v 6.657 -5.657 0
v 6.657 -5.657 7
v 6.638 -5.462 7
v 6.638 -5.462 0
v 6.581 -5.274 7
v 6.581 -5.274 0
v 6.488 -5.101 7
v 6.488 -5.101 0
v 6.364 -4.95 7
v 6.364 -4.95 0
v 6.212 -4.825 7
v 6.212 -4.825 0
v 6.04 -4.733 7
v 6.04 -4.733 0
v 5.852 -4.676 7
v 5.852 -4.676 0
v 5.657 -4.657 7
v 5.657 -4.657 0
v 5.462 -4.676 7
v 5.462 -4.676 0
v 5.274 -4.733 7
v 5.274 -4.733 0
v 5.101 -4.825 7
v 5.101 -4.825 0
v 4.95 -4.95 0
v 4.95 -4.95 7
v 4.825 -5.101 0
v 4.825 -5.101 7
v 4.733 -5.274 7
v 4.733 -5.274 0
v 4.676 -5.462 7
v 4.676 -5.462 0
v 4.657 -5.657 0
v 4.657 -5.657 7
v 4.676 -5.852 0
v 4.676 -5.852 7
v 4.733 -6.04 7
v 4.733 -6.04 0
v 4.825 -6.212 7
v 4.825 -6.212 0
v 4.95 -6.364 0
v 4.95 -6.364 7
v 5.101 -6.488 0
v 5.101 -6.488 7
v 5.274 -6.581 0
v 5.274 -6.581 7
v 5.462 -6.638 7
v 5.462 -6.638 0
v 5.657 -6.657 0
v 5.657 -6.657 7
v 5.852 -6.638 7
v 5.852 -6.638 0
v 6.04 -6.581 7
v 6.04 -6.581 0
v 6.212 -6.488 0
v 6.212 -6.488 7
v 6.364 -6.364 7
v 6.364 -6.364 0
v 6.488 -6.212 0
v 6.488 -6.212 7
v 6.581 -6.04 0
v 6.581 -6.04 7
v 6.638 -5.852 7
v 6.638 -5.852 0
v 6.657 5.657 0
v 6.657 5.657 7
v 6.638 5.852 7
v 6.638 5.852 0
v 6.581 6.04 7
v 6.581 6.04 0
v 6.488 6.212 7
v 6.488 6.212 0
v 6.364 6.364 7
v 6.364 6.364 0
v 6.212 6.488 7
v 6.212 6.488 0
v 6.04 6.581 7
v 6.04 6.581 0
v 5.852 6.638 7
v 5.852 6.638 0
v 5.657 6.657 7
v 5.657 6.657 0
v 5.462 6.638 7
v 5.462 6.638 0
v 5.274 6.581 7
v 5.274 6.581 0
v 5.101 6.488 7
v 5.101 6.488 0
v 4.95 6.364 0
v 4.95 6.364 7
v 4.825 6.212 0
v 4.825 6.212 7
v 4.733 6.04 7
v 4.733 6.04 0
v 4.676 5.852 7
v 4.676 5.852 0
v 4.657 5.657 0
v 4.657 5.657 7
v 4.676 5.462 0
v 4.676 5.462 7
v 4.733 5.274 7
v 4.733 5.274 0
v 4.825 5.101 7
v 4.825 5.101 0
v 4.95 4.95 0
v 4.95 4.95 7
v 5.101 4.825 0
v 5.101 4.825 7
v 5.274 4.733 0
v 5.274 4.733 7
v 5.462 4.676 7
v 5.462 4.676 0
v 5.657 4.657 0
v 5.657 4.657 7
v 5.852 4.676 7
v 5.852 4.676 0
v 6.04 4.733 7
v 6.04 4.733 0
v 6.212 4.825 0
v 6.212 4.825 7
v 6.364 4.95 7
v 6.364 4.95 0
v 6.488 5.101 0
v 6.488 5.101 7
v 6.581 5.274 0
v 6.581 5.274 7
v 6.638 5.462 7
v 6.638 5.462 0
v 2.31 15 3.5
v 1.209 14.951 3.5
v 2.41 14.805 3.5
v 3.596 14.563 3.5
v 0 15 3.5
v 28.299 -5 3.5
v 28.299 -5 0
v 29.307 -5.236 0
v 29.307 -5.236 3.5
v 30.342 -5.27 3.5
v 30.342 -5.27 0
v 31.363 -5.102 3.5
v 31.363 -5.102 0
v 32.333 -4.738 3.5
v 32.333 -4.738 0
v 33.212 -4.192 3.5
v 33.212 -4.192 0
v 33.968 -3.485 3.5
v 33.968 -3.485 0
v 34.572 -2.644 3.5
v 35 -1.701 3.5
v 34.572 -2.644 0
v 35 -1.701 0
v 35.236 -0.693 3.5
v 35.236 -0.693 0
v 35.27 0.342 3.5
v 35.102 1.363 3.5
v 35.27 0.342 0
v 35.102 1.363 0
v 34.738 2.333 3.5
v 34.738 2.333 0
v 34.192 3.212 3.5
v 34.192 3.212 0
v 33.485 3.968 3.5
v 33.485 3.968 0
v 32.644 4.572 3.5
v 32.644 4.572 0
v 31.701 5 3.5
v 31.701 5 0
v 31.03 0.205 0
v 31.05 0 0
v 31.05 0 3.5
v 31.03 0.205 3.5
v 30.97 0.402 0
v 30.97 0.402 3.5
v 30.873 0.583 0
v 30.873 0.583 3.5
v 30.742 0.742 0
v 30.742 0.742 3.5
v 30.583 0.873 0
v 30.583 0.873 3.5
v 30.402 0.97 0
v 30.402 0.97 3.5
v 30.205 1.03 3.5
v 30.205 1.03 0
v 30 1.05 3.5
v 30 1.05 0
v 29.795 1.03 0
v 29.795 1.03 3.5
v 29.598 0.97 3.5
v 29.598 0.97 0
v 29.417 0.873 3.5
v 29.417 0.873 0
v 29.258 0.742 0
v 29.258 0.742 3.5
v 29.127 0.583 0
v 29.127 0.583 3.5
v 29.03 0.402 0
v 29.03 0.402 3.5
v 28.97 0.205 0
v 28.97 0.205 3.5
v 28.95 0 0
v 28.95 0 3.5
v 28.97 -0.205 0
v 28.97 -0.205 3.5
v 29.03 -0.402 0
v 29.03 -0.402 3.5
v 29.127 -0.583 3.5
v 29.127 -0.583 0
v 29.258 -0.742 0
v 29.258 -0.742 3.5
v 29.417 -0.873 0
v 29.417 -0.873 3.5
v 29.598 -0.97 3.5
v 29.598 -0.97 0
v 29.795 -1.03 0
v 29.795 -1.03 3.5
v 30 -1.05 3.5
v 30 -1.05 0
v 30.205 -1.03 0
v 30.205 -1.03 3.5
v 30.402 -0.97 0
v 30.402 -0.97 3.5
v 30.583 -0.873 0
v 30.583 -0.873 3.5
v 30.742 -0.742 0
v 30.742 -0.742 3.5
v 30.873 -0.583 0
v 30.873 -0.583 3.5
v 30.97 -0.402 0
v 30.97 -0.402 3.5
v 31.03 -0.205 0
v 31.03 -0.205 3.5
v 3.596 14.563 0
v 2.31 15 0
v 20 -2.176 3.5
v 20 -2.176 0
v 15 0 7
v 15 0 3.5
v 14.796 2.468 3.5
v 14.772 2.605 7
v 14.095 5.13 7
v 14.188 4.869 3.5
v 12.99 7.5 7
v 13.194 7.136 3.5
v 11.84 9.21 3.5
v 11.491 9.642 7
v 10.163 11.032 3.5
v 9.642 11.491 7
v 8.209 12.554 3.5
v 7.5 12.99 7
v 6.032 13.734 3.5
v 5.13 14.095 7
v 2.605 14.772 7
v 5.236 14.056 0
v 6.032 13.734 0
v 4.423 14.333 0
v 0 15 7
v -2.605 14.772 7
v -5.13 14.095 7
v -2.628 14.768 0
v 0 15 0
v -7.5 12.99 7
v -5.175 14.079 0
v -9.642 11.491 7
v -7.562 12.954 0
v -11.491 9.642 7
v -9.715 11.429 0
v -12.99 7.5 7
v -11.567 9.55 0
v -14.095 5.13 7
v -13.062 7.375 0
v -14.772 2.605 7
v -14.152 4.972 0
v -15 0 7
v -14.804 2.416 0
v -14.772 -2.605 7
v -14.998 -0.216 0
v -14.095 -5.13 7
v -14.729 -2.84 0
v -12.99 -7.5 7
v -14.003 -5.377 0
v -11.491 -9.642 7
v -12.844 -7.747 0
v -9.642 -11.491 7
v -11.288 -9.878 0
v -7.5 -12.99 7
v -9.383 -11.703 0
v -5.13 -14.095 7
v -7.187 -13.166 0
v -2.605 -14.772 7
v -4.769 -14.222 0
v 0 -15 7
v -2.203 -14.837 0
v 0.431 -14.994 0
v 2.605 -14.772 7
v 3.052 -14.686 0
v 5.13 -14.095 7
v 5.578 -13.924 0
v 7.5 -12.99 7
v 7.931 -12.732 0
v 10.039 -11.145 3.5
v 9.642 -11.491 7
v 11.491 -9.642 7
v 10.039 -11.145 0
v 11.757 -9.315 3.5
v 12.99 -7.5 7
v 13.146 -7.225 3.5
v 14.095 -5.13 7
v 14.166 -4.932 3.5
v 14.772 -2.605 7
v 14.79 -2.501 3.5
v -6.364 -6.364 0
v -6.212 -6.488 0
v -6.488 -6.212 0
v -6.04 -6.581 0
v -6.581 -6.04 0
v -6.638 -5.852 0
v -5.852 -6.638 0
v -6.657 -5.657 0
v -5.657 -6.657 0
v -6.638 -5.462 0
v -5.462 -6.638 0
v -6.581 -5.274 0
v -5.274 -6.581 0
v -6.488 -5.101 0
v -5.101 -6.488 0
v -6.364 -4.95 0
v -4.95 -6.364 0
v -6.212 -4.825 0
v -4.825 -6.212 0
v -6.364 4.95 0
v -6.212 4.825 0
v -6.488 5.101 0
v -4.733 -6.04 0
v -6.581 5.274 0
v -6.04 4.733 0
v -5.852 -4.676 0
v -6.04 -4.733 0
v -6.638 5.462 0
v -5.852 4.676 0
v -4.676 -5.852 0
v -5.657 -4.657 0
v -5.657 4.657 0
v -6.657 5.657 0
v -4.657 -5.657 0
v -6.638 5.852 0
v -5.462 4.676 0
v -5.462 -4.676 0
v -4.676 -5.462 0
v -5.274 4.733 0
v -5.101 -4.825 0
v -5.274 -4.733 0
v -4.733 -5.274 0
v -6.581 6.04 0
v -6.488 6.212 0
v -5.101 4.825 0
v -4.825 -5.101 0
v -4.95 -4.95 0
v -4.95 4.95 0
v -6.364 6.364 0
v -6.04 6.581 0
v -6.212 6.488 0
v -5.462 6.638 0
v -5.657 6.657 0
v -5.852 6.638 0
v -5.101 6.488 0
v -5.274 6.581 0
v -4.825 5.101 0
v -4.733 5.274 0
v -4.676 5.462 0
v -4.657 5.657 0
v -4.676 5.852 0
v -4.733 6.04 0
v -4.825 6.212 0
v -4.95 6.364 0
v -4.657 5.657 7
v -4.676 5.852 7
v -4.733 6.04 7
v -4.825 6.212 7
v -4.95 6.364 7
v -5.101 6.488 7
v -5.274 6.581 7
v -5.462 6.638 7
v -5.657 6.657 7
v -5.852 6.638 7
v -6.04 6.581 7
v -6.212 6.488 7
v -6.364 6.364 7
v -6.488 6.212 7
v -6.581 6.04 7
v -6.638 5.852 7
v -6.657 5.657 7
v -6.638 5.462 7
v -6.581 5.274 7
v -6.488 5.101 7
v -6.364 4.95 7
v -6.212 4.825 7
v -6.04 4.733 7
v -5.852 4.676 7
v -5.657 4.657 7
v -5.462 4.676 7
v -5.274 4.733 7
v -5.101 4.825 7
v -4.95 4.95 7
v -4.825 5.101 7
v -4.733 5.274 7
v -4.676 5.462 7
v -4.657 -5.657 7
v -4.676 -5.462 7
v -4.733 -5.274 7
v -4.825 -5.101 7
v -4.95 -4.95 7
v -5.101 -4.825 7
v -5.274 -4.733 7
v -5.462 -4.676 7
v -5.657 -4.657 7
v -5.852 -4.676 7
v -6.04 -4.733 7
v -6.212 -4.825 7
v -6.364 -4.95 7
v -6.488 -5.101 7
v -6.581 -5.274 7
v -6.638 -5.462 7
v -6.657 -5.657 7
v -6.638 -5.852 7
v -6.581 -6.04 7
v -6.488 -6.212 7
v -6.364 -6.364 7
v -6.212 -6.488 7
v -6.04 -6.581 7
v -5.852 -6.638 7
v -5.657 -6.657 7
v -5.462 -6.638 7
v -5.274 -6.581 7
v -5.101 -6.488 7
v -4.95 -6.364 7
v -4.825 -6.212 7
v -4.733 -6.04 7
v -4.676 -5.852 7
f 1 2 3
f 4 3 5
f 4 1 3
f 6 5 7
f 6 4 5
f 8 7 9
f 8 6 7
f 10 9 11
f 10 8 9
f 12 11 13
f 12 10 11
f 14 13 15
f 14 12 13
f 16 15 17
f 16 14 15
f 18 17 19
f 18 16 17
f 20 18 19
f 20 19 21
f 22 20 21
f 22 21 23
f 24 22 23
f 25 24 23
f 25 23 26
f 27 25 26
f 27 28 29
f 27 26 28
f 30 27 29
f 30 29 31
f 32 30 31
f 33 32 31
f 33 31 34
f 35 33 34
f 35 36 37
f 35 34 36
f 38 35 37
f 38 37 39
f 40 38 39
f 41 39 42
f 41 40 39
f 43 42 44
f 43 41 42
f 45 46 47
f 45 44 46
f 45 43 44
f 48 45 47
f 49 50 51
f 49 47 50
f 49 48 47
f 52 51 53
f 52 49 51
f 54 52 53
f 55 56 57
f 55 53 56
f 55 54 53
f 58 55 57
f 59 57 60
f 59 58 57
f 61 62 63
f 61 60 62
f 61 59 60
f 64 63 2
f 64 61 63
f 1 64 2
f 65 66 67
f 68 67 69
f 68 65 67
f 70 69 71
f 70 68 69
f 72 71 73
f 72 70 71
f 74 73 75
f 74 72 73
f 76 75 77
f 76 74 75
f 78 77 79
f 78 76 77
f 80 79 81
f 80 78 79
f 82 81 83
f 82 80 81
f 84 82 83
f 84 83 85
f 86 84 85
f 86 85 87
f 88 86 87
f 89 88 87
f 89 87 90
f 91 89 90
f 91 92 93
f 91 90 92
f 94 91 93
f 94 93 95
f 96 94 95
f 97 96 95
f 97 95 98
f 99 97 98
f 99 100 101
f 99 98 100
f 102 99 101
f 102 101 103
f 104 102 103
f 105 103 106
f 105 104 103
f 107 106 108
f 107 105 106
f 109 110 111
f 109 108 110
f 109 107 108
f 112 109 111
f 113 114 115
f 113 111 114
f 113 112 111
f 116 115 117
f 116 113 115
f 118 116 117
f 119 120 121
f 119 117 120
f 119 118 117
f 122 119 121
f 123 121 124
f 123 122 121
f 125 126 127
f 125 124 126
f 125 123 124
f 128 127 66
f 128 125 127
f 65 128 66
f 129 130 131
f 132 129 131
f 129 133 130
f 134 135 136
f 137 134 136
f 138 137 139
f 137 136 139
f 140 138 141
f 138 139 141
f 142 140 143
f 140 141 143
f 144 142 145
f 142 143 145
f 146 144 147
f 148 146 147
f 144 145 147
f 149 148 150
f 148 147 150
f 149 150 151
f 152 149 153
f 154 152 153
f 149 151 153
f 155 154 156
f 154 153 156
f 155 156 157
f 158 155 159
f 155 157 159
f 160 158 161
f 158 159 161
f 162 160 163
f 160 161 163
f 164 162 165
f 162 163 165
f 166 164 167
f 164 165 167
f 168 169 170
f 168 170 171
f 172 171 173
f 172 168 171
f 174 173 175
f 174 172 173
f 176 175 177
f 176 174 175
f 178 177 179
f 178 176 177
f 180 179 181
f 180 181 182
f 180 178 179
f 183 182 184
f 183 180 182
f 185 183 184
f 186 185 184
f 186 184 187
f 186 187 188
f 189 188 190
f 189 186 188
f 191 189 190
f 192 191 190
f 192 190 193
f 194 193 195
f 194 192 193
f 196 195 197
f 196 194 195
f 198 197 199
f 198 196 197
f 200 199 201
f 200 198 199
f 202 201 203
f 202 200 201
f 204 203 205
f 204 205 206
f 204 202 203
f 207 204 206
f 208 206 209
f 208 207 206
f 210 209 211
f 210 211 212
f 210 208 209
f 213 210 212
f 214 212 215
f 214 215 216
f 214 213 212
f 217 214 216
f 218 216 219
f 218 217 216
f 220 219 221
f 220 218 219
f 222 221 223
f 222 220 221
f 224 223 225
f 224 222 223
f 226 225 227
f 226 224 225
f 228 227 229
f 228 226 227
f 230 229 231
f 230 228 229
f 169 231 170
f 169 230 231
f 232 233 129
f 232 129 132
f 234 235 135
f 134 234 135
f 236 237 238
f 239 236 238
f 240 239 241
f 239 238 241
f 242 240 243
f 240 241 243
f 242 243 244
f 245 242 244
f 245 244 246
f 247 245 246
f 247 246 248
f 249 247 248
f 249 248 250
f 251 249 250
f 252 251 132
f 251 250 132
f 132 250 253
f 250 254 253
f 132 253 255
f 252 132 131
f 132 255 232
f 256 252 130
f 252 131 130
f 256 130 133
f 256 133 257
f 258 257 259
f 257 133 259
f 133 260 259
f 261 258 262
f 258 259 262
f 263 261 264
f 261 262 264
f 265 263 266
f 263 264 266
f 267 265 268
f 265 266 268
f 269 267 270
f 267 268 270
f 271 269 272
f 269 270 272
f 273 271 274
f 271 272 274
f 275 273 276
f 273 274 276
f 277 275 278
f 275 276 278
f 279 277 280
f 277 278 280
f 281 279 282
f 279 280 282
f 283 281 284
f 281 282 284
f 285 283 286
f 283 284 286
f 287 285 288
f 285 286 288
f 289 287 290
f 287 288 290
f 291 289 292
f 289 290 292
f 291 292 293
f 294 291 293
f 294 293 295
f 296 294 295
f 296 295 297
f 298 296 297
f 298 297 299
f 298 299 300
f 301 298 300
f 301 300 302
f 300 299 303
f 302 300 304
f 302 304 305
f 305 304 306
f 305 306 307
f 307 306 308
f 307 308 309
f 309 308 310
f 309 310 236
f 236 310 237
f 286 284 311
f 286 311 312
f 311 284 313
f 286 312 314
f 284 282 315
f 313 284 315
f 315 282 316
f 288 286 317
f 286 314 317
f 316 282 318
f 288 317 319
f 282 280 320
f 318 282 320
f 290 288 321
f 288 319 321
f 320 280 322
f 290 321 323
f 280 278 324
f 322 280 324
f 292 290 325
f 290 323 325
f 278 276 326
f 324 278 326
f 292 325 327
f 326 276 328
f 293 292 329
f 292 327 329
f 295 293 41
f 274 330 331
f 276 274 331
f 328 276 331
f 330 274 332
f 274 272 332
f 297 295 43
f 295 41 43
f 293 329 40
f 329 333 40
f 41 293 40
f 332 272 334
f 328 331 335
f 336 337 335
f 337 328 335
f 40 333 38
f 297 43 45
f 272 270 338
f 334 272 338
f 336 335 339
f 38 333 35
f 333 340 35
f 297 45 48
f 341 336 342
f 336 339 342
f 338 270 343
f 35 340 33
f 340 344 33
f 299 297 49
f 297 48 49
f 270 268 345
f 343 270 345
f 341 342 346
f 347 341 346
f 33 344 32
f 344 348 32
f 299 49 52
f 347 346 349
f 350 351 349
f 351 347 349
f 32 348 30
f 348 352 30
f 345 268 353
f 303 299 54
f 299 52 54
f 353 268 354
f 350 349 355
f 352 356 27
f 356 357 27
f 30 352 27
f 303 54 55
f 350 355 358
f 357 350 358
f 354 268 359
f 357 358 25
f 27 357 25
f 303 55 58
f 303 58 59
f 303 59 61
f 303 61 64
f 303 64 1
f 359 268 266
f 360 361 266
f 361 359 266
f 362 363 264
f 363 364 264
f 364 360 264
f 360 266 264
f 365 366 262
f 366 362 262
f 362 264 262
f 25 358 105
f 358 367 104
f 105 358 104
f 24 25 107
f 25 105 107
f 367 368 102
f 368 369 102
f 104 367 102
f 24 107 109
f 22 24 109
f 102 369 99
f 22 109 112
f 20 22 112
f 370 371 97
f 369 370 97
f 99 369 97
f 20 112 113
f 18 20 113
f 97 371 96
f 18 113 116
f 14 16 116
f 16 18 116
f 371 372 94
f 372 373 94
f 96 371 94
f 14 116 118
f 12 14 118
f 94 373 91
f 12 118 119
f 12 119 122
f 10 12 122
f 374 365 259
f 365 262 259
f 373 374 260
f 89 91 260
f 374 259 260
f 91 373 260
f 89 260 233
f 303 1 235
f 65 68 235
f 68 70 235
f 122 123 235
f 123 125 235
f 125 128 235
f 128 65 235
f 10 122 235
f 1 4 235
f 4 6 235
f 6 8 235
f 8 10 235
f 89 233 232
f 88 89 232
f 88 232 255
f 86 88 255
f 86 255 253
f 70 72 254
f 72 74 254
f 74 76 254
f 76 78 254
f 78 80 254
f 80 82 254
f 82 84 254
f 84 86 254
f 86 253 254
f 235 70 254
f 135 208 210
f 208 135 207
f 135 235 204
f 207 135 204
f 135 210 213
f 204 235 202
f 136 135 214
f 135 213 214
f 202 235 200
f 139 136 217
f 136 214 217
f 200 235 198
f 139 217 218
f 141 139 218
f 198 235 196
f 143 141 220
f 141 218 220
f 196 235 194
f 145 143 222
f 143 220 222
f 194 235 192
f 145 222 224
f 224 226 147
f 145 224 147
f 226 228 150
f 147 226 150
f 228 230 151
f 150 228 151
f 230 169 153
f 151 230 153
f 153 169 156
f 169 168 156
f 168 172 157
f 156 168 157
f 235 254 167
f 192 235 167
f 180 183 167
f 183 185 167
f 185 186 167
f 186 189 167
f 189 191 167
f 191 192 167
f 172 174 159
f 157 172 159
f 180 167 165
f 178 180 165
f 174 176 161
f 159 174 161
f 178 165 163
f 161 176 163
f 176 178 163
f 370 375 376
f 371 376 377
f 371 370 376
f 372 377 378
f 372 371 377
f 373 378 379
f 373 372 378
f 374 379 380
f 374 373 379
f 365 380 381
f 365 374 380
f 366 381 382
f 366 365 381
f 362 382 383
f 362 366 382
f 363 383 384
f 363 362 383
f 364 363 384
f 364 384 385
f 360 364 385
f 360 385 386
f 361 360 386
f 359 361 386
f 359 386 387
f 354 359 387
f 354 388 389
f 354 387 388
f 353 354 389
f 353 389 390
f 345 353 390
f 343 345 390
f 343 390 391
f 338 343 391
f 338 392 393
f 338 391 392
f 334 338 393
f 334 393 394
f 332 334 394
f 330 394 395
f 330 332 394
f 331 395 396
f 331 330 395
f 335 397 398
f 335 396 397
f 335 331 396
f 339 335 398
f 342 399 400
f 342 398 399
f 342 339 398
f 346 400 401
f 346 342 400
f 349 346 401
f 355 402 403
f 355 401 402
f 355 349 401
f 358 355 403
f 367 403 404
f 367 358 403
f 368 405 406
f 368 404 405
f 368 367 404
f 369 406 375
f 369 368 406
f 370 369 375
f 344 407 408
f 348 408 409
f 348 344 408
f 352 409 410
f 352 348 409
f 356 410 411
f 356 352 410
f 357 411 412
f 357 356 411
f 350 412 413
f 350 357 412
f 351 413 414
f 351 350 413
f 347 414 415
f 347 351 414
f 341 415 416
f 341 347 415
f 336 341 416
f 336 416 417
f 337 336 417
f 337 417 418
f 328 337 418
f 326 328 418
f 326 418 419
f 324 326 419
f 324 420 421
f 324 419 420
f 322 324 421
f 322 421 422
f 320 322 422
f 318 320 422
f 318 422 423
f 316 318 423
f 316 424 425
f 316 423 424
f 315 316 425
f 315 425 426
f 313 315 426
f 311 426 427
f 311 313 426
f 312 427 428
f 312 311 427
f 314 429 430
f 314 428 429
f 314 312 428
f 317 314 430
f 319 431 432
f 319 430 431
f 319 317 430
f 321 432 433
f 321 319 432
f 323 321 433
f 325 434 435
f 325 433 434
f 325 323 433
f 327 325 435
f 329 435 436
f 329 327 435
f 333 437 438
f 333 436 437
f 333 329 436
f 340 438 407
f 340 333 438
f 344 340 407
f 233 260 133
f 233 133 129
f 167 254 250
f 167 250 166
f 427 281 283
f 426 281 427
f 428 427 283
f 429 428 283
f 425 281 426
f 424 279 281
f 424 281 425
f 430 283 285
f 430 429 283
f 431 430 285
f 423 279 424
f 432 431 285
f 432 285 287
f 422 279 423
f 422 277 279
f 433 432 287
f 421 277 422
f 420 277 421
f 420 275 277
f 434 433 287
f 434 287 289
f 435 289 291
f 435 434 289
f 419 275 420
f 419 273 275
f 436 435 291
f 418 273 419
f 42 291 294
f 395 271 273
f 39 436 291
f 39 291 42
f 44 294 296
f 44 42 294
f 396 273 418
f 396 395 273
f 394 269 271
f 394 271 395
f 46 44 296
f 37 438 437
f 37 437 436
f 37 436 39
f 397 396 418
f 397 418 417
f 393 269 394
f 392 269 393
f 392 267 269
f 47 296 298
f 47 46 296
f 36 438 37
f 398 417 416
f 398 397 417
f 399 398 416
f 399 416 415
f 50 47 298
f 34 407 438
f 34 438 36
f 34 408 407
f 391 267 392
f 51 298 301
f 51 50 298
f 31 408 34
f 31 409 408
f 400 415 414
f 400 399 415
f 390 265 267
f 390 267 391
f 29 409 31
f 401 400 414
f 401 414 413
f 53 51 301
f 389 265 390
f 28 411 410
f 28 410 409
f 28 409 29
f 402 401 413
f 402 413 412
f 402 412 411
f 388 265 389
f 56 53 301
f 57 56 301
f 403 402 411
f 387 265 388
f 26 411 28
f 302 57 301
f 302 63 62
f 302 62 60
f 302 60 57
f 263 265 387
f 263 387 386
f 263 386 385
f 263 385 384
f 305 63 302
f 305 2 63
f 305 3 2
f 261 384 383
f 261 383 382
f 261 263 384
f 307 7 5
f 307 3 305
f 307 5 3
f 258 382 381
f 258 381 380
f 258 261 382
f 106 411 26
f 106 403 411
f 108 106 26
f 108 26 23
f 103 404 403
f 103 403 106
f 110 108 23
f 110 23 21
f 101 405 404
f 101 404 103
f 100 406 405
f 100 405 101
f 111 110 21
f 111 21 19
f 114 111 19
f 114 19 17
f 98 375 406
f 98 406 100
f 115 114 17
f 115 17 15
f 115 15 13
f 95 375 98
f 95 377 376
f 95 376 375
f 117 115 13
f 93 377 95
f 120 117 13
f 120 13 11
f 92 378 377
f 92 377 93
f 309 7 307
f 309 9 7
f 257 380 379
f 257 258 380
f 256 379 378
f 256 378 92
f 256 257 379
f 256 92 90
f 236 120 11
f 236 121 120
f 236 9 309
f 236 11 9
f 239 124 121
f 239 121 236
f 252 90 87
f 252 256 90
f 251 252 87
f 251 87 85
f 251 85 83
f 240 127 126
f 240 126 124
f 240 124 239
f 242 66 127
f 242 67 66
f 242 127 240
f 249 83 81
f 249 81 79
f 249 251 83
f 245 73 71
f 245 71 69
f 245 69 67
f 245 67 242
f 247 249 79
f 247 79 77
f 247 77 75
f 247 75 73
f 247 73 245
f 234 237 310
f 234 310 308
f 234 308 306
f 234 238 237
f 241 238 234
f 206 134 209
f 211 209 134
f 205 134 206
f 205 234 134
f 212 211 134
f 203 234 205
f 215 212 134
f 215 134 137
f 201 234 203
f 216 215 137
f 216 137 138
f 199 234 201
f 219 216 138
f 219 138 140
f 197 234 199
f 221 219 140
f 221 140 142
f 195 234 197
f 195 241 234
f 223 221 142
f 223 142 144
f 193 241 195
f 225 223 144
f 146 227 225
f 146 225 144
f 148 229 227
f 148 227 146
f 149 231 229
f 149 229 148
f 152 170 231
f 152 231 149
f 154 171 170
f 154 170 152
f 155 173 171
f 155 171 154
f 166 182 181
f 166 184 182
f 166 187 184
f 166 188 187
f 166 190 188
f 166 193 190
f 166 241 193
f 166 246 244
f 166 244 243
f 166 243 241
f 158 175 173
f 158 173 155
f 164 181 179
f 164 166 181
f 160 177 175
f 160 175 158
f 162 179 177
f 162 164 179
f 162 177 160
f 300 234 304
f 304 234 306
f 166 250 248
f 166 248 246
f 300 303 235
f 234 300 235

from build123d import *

# Parameters (mm, degrees)
SKETCH_R     = 1.05
PAD_DEPTH    = 3.5
SKETCH001_R  = 15
PAD001_DEPTH = 7
SKETCH002_R  = 1
POCKET_DEPTH = 10


with BuildPart() as part:
    # Sketch → Pad (new body)
    with BuildSketch(Plane.XY):
        with BuildLine():
            ThreePointArc((0, 15), (-14.003706, -5.375519), (10.036959, -11.147172))
            Line((10.036959, -11.147172), (20, -2.17641))
            Line((20, -2.17641), (28.298795, -5))
            ThreePointArc((28.298795, -5), (35, -1.701205), (31.701205, 5))
            Line((2.310268, 15), (31.701205, 5))
            Line((0, 15), (2.310268, 15))
        make_face()
        with Locations((30, 0)):
            Circle(SKETCH_R, mode=Mode.SUBTRACT)
    extrude(amount=PAD_DEPTH)

    # Sketch001 → Pad001 (join)
    with BuildSketch(Plane.XY):
        Circle(SKETCH001_R)
    extrude(amount=PAD001_DEPTH)

    # Sketch002 → Pocket (cut)
    with BuildSketch(Plane.XY):
        with Locations((-5.656854, 5.656854)):
            Circle(SKETCH002_R)
        with Locations((5.656854, 5.656854)):
            Circle(SKETCH002_R)
        with Locations((5.656854, -5.656854)):
            Circle(SKETCH002_R)
        with Locations((-5.656854, -5.656854)):
            Circle(SKETCH002_R)
    extrude(amount=POCKET_DEPTH, mode=Mode.SUBTRACT)


solid = part.part
